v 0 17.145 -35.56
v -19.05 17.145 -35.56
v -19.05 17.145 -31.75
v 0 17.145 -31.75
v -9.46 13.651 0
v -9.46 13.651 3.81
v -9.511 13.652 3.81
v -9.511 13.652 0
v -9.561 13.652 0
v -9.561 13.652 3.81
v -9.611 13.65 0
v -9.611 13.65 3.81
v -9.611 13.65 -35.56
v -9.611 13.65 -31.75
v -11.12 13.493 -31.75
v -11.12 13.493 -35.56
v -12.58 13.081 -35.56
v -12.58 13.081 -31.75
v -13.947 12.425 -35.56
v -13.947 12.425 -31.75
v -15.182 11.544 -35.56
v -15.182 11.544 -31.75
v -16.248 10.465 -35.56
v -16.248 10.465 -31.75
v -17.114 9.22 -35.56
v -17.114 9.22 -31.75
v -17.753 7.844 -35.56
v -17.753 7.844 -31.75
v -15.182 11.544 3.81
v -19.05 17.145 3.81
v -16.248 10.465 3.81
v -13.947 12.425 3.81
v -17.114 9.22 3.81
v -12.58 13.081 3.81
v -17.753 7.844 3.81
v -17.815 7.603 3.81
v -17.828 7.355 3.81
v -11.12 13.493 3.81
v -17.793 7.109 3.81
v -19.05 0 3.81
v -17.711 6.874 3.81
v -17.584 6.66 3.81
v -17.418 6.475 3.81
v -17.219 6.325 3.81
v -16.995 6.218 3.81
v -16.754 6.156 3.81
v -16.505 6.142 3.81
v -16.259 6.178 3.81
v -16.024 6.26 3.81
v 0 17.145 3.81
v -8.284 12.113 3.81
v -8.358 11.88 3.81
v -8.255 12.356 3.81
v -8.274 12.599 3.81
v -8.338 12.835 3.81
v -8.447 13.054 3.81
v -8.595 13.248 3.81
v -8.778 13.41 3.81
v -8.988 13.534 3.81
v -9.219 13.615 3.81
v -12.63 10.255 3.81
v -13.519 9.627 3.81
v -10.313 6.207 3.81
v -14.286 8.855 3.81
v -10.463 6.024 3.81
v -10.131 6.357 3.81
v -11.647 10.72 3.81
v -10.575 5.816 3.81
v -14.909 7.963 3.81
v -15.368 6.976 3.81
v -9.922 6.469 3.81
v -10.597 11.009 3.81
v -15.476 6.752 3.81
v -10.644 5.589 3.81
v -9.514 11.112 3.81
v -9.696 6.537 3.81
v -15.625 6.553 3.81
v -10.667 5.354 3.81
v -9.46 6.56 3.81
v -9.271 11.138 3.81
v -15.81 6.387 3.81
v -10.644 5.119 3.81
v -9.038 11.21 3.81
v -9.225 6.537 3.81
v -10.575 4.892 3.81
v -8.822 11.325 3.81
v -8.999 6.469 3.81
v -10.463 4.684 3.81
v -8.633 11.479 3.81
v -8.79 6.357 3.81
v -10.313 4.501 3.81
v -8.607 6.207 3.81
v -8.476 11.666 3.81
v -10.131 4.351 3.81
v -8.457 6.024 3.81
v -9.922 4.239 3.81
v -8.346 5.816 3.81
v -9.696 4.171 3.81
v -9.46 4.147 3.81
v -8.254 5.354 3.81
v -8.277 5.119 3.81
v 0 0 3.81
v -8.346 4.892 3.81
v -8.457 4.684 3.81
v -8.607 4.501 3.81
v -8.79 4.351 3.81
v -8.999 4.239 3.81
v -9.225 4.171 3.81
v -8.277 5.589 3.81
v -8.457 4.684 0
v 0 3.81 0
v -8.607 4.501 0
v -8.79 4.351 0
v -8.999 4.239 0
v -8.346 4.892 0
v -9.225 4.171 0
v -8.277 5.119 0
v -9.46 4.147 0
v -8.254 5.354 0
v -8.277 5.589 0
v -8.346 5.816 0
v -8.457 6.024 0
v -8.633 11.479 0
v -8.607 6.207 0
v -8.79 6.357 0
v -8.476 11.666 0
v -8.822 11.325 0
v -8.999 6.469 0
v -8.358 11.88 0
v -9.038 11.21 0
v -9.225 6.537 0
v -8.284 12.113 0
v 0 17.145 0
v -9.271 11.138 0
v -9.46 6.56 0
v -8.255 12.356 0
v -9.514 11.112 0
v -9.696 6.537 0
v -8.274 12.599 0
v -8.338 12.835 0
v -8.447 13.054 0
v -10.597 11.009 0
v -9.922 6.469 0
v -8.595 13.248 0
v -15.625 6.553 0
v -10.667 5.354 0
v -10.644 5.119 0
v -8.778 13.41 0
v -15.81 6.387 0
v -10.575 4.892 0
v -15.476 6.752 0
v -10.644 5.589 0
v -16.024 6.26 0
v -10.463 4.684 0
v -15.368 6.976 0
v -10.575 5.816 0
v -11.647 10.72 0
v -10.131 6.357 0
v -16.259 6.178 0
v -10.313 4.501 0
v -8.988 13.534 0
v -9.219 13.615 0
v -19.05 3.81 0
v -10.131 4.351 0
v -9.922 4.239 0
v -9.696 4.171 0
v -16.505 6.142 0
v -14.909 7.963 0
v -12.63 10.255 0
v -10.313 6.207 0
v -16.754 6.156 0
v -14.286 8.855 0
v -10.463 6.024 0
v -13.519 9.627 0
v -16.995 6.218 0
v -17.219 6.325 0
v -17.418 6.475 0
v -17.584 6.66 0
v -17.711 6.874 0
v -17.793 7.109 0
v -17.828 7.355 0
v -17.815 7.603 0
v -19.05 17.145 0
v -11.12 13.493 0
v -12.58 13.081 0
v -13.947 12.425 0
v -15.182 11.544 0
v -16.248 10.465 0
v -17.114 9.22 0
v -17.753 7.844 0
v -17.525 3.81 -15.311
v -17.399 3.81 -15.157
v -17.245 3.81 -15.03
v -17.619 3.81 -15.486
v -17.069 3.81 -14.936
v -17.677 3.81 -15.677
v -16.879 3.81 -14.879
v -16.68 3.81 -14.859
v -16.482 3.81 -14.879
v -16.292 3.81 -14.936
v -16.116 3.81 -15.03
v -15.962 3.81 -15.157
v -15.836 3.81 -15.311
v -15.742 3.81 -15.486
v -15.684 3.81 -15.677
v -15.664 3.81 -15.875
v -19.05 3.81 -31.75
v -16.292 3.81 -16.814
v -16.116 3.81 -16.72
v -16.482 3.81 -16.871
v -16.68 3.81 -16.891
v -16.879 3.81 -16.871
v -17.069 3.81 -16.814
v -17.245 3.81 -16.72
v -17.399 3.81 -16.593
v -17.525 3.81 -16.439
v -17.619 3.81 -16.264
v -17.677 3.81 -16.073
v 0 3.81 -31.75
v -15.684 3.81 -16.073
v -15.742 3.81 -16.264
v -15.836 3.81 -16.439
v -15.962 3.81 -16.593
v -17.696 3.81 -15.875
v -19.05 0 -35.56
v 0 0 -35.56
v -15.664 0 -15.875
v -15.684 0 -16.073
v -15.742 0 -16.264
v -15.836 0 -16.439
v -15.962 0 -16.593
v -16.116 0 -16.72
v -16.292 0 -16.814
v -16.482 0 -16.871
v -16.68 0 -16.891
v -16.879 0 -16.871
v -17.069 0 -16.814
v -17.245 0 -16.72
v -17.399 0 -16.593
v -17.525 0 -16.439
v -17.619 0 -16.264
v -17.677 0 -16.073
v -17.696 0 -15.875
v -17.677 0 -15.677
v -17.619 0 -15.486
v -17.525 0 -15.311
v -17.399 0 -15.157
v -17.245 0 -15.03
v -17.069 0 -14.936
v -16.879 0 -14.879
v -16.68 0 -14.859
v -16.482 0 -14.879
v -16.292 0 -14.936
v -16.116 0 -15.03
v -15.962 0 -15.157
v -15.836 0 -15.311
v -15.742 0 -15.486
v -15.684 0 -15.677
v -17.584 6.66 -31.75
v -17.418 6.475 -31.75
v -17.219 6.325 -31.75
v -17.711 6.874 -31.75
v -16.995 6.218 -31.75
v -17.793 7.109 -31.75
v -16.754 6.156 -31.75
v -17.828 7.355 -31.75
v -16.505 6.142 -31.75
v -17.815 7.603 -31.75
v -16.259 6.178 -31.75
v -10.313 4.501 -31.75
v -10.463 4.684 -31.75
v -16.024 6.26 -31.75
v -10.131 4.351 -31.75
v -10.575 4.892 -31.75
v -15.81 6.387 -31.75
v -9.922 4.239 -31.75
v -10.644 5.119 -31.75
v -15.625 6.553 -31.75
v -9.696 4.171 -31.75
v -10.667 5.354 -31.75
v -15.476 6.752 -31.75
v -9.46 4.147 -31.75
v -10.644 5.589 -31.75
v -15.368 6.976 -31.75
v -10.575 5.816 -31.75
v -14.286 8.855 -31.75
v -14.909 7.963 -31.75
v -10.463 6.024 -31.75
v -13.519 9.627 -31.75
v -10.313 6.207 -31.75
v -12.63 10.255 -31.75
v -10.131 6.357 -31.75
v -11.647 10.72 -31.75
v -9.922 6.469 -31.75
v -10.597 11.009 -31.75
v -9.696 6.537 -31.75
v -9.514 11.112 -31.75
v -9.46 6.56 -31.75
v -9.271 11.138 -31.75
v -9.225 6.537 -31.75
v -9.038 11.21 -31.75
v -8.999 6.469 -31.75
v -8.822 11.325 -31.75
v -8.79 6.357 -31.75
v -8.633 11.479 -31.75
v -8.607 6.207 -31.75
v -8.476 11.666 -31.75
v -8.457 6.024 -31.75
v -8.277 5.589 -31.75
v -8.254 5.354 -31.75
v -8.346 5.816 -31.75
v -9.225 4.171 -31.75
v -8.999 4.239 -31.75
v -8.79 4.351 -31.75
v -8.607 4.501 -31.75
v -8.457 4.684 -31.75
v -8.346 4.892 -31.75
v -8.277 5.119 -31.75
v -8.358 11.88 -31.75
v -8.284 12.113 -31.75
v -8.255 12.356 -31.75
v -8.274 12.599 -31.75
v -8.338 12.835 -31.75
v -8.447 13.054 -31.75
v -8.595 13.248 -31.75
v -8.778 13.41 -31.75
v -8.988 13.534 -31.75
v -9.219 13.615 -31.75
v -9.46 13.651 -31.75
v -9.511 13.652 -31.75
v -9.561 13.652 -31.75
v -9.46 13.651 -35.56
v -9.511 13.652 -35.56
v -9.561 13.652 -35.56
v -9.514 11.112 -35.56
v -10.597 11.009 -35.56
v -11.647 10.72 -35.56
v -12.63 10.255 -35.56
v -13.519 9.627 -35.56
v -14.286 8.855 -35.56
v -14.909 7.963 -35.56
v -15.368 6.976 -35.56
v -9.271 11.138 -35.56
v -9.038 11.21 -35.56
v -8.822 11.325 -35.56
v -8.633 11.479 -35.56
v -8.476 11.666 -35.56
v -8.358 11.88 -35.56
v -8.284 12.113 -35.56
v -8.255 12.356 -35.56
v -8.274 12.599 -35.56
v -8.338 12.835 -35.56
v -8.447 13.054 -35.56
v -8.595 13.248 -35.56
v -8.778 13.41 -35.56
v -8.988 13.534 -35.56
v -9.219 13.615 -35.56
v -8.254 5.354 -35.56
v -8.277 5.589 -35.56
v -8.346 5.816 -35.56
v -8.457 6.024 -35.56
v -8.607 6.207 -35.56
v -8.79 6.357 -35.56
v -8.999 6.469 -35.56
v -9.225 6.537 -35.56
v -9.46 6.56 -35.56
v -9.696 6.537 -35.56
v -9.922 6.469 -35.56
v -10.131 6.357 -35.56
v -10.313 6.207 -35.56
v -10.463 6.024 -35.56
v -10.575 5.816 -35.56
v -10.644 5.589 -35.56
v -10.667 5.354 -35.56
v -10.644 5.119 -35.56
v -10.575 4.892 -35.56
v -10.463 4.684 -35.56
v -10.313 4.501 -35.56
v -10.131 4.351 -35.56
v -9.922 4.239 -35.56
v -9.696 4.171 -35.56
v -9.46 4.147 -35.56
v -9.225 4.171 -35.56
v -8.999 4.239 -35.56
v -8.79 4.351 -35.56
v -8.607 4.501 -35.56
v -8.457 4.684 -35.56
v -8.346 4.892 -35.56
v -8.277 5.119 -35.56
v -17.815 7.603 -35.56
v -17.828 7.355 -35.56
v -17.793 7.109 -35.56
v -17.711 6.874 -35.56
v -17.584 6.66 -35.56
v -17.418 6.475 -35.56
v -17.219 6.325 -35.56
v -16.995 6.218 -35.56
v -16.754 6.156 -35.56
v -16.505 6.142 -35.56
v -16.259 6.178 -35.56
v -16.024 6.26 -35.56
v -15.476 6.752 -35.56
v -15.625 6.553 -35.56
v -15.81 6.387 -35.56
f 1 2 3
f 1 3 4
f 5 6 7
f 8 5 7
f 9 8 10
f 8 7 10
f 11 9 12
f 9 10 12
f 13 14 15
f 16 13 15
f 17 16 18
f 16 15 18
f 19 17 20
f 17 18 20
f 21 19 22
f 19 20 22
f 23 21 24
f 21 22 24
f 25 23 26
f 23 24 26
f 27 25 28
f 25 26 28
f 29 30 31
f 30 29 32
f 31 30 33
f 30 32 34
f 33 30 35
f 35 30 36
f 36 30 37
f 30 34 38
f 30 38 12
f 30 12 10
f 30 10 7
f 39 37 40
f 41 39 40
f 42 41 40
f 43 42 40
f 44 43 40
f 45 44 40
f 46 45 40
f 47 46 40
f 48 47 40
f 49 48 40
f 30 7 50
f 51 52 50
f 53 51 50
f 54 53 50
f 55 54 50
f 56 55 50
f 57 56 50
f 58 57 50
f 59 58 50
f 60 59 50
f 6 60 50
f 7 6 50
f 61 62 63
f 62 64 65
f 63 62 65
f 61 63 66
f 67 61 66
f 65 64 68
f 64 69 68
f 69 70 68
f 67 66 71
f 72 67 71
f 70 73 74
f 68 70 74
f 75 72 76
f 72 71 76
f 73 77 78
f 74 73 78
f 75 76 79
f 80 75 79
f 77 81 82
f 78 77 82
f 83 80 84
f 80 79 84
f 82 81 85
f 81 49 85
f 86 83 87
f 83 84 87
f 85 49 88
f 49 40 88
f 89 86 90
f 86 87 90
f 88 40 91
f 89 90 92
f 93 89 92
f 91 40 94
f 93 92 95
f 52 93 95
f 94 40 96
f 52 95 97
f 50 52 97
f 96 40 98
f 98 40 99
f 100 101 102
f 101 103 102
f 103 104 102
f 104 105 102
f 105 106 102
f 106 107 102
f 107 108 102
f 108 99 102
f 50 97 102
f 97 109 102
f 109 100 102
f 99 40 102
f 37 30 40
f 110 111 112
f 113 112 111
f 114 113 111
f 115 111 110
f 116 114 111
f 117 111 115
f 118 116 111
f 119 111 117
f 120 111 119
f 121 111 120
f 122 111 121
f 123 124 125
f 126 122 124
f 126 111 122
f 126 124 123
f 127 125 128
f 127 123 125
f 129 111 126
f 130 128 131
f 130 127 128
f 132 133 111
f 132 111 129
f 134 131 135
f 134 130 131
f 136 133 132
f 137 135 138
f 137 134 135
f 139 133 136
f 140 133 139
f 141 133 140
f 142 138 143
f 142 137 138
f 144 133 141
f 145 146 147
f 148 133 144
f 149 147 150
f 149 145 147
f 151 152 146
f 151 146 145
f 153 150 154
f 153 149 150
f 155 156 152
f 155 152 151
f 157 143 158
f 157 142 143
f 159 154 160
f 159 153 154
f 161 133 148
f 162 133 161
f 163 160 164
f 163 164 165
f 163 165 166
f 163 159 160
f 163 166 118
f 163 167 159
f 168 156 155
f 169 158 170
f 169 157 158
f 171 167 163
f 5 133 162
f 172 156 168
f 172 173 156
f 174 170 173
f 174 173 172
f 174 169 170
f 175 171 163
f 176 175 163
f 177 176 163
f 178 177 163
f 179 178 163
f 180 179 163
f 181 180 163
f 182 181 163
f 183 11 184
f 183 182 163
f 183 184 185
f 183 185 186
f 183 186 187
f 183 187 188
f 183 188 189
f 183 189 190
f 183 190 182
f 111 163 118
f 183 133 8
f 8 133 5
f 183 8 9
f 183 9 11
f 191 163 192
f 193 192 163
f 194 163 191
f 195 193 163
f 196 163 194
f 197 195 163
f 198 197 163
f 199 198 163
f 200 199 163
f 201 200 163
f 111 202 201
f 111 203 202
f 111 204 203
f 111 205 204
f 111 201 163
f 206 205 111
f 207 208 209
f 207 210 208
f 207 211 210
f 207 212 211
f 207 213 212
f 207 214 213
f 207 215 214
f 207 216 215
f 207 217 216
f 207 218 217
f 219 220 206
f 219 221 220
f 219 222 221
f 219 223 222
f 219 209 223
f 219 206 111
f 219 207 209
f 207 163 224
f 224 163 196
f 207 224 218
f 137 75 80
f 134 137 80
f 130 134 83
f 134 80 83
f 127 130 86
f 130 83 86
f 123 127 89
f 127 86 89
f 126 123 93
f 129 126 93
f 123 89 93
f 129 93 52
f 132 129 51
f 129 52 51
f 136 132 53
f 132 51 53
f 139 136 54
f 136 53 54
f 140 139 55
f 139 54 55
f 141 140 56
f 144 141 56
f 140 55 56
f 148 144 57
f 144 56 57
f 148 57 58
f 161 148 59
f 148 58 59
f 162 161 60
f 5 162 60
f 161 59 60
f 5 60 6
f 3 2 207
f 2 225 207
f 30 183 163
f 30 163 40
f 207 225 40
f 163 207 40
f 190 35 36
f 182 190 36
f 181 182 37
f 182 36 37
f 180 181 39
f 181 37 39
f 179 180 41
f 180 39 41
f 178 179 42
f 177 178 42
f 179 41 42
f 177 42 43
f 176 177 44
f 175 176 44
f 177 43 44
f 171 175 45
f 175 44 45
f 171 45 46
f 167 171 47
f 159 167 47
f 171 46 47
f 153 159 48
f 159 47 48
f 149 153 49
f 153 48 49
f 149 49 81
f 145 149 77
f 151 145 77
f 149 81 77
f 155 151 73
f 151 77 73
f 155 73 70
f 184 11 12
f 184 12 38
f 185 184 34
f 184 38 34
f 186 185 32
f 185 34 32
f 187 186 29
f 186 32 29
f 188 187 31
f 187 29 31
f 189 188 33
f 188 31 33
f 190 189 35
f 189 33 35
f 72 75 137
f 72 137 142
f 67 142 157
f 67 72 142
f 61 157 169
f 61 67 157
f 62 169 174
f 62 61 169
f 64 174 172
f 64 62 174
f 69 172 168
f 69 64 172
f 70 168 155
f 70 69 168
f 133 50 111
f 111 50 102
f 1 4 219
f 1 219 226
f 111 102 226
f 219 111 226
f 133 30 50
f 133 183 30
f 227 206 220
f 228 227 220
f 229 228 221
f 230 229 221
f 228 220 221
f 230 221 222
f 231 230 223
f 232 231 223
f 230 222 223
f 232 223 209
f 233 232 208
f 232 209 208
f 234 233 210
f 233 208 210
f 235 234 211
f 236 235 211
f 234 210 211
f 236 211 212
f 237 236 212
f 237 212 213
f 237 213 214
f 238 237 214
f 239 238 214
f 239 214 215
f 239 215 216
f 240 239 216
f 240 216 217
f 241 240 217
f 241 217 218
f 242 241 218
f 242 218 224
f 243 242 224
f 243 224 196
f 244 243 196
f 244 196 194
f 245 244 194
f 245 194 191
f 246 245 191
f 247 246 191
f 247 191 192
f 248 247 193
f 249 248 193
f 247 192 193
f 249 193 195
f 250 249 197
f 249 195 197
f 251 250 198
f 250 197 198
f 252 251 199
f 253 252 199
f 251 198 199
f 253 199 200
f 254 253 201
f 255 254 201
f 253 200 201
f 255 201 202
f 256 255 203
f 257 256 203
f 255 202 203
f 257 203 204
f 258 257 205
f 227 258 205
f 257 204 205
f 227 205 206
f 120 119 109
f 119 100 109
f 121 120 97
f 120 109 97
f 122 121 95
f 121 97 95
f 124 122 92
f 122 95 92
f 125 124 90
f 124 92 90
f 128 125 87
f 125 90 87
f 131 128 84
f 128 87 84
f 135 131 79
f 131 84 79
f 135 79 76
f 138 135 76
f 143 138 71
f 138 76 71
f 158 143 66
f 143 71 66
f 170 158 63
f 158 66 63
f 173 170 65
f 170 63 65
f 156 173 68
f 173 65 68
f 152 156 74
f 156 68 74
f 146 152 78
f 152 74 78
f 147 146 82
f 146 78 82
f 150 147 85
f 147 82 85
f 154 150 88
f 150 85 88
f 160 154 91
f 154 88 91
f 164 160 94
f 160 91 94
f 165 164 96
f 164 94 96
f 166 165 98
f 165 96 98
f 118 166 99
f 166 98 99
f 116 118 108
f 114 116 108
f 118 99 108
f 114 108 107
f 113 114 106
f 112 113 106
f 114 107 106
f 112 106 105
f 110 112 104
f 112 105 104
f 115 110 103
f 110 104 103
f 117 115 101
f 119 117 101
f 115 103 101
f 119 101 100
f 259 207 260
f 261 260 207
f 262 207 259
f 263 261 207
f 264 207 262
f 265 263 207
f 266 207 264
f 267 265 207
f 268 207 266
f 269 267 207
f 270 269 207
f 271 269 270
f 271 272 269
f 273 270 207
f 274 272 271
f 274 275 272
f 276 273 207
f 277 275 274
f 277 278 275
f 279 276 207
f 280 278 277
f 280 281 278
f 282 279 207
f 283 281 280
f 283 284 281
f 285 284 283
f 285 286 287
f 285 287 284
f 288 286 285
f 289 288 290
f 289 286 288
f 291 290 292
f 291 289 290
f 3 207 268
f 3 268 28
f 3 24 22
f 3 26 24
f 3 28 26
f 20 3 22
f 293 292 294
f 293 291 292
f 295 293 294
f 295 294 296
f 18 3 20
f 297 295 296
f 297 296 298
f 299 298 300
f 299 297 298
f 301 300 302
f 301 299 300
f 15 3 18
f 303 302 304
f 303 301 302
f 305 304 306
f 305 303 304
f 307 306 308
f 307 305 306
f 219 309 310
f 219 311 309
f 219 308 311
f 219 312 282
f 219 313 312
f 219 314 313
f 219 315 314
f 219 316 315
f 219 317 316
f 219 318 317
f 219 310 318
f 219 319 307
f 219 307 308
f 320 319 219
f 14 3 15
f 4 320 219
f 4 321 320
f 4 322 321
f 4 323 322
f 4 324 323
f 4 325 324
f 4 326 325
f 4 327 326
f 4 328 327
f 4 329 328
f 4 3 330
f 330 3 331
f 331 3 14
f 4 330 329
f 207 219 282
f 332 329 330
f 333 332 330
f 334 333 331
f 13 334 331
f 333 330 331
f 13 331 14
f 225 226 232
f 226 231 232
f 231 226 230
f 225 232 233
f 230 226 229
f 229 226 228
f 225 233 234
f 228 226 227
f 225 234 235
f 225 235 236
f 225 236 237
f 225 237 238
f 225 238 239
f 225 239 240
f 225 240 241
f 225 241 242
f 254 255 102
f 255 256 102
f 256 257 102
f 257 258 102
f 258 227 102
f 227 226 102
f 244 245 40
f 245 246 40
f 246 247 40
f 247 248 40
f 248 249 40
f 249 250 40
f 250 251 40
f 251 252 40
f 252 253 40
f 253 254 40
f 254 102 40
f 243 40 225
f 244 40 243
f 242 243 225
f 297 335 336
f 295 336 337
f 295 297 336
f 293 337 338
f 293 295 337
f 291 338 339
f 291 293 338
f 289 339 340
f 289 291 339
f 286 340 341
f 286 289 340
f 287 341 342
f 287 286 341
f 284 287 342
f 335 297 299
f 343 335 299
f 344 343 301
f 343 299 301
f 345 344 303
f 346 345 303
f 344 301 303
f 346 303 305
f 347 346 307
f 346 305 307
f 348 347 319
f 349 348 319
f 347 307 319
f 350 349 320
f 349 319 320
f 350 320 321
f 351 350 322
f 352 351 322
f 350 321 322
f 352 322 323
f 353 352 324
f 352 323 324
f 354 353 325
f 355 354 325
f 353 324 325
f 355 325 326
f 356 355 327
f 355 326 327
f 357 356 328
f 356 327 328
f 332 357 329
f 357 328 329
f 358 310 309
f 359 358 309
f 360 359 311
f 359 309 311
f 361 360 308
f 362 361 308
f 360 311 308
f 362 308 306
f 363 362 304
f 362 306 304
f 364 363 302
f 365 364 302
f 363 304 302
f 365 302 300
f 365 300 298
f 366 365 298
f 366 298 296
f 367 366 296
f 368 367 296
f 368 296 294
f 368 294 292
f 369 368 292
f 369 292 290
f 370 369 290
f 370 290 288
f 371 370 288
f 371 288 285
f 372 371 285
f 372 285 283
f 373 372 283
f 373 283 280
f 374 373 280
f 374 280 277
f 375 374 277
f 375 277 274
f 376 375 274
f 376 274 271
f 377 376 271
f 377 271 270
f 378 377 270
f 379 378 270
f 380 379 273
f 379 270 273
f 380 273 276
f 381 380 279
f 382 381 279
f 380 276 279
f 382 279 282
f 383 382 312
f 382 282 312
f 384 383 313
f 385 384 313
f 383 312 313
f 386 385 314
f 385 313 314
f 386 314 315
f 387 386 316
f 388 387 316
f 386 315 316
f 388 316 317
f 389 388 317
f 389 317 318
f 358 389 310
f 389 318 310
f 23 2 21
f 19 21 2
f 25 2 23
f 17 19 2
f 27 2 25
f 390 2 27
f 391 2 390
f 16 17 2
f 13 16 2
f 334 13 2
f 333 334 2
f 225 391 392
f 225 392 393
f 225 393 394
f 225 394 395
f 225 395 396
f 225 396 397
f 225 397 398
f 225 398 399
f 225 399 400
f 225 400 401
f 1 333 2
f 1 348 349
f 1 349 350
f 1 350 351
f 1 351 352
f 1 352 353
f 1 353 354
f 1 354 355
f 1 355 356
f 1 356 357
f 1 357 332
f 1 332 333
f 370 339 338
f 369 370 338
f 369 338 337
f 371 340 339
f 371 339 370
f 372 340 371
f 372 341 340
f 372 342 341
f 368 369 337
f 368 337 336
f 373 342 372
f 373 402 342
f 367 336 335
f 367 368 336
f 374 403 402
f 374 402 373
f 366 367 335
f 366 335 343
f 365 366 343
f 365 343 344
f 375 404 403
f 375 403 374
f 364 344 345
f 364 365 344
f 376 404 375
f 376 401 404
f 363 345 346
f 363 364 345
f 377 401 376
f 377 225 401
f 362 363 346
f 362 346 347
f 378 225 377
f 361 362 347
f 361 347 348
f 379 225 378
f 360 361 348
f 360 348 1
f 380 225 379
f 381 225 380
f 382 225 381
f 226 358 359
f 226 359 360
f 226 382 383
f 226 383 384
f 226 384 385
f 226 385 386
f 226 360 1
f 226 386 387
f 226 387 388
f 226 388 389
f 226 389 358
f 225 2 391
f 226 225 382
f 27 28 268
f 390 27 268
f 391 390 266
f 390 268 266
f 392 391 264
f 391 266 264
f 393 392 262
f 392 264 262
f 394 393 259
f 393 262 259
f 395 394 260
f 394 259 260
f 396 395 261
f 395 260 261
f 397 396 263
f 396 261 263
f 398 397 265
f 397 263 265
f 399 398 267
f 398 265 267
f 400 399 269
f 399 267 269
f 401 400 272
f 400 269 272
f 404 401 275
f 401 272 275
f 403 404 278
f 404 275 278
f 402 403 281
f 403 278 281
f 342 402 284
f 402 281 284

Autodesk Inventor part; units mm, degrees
ref_plane "YZ Plane" through (0, 0, 0) normal (1, 0, 0) x (0, 1, 0)
ref_plane "XZ Plane" through (0, 0, 0) normal (0, 1, 0) x (-1, 0, 0)
ref_plane "XY Plane" through (0, 0, 0) normal (0, 0, 1) x (1, 0, 0)
sketch "Sketch1" plane through (0, 0, 0) normal (0, 1, 0) x (-1, 0, 0)
  line L0 (0, 0) -> (19.05, 0)
  line L1 (19.05, 0) -> (19.05, -31.75)
  line L2 (19.05, -31.75) -> (0, -31.75)
  line L3 (0, -31.75) -> (0, 0)
  line L4 (19.05, 0) -> (19.05, 3.81)
  line L5 (19.05, 3.81) -> (0, 3.81)
  line L6 (0, 3.81) -> (0, 0)
  line L7 (19.05, -31.75) -> (19.05, -35.56)
  line L8 (19.05, -35.56) -> (0, -35.56)
  line L9 (0, -35.56) -> (0, -31.75)
  dimension "d0" = 19.05
  dimension "d1" = 31.75
  dimension "d4" = 3.81
  dimension "d5" = 3.81
extrude "Extrusion2" add sketch "Sketch1" along normal blind 9.525
sketch "Sketch3" plane through (0, 9.525, 0) normal (0, 1, 0) x (1, 0, 0)
  line L0 (0, 0) -> (-19.05, 0)
  line L1 (-19.05, 31.75) -> (0, 31.75)
  line L2 (0, 0) -> (0, 31.75)
  line L3 (-19.05, 31.75) -> (-19.05, 0)
  point P0 (-19.05, 35.56)
extrude "Extrusion3" cut sketch "Sketch3" against normal blind 5.715
sketch "Sketch4" plane through (0, 9.525, 0) normal (0, 1, 0) x (1, 0, 0)
  line L0 (-18.8776, 0) -> (0, 0)
  line L1 (0, 0) -> (0, -3.81)
  line L2 (0, -3.81) -> (-18.8776, -3.81)
  line L3 (-19.05, 35.56) -> (0, 35.56)
  line L4 (0, 35.56) -> (0, 31.75)
  line L5 (0, 31.75) -> (-19.05, 31.75)
  line L6 (-19.05, 31.75) -> (-19.05, 35.56)
  line L7 (-18.8776, 0) -> (-19.05, 0)
  line L8 (0, 0) -> (-19.05, 0) projected
  line L9 (-19.05, 0) -> (-19.05, -3.81)
  line L10 (-18.8776, -3.81) -> (-19.05, -3.81)
  line L11 (-19.05, -3.81) -> (0, -3.81) projected
extrude "Extrusion4" add sketch "Sketch4" along normal blind 7.62
sketch "Sketch5" plane through (0, 3.81, 0) normal (0, 1, 0) x (1, 0, 0)
  line L0 (-19.0656, 0) -> (0, 0)
  line L1 (0, 0) -> (0, 31.75)
  line L2 (0, 31.75) -> (-19.0656, 31.75)
  line L3 (-19.0656, 31.75) -> (-19.0656, 0)
  line L4 (0, 0) -> (-19.05, 0) projected
  line L5 (-19.05, 31.75) -> (0, 31.75) projected
  line L6 (-9.525, 0) -> (22.3112, 0) construction
  line L7 (-9.525, 31.75) -> (-9.525, 0)
  line L8 (-9.525, 0) -> (-9.525, 15.875)
  line L9 (-9.525, 15.875) -> (-9.525, 31.75)
  circle A0 centre (-16.6804, 15.875) radius 1.016
  point P0 (-18.8776, 0)
  dimension "d43" = 2.032
extrude "Extrusion5" cut sketch "Sketch5" against normal blind 3.81 contours A0
sketch "Sketch7" plane through (0, 0, -35.56) normal (0, 0, -1) x (-1, 0, 0)
  line L0 (19.05, 3.81) -> (0, 3.81)
  line L1 (0, 3.81) -> (0, 17.145)
  line L2 (0, 17.145) -> (19.05, 17.145)
  line L3 (19.05, 17.145) -> (19.05, 3.81)
  line L4 (19.05, 17.145) -> (0, 17.145) projected
  line L5 (19.05, 3.81) -> (0, 3.81) projected
  line L6 (0, 17.145) -> (0, 3.81) projected
  circle A0 centre (9.525, 12.3825) radius 1.016
  point P0 (0, 0)
  dimension "d42" = 2.032
extrude "Extrusion7" cut sketch "Sketch7" against normal blind 39.37 contours A0
sketch "Sketch13" plane through (-19.05, 0, 3.81) normal (0, 0, 1) x (1, 0, 0)
  arc A0 (9.5897, 13.6509) -> (9.4386, 13.6496) centre (9.525, 12.3825) ccw
  arc A1 (9.5359, 11.1125) -> (3.682, 6.9762) centre (9.5897, 4.826) ccw
  arc A2 (9.5897, 13.6509) -> (1.297, 7.8443) centre (9.5897, 4.826) ccw
  line L0 (9.5897, 4.826) -> (18.4145, 4.826) construction
  line L1 (9.5897, 4.826) -> (18.4145, 4.826) construction
  arc A3 (1.297, 7.8443) -> (3.682, 6.9762) centre (2.4895, 7.4102) ccw
  line L2 (9.5897, 4.826) -> (11.1137, 4.826) construction
  line L3 (9.5897, 6.5604) -> (9.5897, 5.3539)
  circle A4 centre (9.5897, 5.3539) radius 1.2065
  arc A5 (9.5359, 11.1125) -> (9.4386, 13.6496) centre (9.525, 12.3825) ccw
  point P0 (19.05, 0)
  point P1 (9.5897, 3.81)
extrude "Extrusion14" cut sketch "Sketch13" against normal blind 76.2
sketch "Sketch21" plane through (0, 0, 0) normal (0, -1, 0) x (1, 0, 0)
  point P0 (0, 0)
properties part number "landing-gear-ublock" material "ABS Plastic"
